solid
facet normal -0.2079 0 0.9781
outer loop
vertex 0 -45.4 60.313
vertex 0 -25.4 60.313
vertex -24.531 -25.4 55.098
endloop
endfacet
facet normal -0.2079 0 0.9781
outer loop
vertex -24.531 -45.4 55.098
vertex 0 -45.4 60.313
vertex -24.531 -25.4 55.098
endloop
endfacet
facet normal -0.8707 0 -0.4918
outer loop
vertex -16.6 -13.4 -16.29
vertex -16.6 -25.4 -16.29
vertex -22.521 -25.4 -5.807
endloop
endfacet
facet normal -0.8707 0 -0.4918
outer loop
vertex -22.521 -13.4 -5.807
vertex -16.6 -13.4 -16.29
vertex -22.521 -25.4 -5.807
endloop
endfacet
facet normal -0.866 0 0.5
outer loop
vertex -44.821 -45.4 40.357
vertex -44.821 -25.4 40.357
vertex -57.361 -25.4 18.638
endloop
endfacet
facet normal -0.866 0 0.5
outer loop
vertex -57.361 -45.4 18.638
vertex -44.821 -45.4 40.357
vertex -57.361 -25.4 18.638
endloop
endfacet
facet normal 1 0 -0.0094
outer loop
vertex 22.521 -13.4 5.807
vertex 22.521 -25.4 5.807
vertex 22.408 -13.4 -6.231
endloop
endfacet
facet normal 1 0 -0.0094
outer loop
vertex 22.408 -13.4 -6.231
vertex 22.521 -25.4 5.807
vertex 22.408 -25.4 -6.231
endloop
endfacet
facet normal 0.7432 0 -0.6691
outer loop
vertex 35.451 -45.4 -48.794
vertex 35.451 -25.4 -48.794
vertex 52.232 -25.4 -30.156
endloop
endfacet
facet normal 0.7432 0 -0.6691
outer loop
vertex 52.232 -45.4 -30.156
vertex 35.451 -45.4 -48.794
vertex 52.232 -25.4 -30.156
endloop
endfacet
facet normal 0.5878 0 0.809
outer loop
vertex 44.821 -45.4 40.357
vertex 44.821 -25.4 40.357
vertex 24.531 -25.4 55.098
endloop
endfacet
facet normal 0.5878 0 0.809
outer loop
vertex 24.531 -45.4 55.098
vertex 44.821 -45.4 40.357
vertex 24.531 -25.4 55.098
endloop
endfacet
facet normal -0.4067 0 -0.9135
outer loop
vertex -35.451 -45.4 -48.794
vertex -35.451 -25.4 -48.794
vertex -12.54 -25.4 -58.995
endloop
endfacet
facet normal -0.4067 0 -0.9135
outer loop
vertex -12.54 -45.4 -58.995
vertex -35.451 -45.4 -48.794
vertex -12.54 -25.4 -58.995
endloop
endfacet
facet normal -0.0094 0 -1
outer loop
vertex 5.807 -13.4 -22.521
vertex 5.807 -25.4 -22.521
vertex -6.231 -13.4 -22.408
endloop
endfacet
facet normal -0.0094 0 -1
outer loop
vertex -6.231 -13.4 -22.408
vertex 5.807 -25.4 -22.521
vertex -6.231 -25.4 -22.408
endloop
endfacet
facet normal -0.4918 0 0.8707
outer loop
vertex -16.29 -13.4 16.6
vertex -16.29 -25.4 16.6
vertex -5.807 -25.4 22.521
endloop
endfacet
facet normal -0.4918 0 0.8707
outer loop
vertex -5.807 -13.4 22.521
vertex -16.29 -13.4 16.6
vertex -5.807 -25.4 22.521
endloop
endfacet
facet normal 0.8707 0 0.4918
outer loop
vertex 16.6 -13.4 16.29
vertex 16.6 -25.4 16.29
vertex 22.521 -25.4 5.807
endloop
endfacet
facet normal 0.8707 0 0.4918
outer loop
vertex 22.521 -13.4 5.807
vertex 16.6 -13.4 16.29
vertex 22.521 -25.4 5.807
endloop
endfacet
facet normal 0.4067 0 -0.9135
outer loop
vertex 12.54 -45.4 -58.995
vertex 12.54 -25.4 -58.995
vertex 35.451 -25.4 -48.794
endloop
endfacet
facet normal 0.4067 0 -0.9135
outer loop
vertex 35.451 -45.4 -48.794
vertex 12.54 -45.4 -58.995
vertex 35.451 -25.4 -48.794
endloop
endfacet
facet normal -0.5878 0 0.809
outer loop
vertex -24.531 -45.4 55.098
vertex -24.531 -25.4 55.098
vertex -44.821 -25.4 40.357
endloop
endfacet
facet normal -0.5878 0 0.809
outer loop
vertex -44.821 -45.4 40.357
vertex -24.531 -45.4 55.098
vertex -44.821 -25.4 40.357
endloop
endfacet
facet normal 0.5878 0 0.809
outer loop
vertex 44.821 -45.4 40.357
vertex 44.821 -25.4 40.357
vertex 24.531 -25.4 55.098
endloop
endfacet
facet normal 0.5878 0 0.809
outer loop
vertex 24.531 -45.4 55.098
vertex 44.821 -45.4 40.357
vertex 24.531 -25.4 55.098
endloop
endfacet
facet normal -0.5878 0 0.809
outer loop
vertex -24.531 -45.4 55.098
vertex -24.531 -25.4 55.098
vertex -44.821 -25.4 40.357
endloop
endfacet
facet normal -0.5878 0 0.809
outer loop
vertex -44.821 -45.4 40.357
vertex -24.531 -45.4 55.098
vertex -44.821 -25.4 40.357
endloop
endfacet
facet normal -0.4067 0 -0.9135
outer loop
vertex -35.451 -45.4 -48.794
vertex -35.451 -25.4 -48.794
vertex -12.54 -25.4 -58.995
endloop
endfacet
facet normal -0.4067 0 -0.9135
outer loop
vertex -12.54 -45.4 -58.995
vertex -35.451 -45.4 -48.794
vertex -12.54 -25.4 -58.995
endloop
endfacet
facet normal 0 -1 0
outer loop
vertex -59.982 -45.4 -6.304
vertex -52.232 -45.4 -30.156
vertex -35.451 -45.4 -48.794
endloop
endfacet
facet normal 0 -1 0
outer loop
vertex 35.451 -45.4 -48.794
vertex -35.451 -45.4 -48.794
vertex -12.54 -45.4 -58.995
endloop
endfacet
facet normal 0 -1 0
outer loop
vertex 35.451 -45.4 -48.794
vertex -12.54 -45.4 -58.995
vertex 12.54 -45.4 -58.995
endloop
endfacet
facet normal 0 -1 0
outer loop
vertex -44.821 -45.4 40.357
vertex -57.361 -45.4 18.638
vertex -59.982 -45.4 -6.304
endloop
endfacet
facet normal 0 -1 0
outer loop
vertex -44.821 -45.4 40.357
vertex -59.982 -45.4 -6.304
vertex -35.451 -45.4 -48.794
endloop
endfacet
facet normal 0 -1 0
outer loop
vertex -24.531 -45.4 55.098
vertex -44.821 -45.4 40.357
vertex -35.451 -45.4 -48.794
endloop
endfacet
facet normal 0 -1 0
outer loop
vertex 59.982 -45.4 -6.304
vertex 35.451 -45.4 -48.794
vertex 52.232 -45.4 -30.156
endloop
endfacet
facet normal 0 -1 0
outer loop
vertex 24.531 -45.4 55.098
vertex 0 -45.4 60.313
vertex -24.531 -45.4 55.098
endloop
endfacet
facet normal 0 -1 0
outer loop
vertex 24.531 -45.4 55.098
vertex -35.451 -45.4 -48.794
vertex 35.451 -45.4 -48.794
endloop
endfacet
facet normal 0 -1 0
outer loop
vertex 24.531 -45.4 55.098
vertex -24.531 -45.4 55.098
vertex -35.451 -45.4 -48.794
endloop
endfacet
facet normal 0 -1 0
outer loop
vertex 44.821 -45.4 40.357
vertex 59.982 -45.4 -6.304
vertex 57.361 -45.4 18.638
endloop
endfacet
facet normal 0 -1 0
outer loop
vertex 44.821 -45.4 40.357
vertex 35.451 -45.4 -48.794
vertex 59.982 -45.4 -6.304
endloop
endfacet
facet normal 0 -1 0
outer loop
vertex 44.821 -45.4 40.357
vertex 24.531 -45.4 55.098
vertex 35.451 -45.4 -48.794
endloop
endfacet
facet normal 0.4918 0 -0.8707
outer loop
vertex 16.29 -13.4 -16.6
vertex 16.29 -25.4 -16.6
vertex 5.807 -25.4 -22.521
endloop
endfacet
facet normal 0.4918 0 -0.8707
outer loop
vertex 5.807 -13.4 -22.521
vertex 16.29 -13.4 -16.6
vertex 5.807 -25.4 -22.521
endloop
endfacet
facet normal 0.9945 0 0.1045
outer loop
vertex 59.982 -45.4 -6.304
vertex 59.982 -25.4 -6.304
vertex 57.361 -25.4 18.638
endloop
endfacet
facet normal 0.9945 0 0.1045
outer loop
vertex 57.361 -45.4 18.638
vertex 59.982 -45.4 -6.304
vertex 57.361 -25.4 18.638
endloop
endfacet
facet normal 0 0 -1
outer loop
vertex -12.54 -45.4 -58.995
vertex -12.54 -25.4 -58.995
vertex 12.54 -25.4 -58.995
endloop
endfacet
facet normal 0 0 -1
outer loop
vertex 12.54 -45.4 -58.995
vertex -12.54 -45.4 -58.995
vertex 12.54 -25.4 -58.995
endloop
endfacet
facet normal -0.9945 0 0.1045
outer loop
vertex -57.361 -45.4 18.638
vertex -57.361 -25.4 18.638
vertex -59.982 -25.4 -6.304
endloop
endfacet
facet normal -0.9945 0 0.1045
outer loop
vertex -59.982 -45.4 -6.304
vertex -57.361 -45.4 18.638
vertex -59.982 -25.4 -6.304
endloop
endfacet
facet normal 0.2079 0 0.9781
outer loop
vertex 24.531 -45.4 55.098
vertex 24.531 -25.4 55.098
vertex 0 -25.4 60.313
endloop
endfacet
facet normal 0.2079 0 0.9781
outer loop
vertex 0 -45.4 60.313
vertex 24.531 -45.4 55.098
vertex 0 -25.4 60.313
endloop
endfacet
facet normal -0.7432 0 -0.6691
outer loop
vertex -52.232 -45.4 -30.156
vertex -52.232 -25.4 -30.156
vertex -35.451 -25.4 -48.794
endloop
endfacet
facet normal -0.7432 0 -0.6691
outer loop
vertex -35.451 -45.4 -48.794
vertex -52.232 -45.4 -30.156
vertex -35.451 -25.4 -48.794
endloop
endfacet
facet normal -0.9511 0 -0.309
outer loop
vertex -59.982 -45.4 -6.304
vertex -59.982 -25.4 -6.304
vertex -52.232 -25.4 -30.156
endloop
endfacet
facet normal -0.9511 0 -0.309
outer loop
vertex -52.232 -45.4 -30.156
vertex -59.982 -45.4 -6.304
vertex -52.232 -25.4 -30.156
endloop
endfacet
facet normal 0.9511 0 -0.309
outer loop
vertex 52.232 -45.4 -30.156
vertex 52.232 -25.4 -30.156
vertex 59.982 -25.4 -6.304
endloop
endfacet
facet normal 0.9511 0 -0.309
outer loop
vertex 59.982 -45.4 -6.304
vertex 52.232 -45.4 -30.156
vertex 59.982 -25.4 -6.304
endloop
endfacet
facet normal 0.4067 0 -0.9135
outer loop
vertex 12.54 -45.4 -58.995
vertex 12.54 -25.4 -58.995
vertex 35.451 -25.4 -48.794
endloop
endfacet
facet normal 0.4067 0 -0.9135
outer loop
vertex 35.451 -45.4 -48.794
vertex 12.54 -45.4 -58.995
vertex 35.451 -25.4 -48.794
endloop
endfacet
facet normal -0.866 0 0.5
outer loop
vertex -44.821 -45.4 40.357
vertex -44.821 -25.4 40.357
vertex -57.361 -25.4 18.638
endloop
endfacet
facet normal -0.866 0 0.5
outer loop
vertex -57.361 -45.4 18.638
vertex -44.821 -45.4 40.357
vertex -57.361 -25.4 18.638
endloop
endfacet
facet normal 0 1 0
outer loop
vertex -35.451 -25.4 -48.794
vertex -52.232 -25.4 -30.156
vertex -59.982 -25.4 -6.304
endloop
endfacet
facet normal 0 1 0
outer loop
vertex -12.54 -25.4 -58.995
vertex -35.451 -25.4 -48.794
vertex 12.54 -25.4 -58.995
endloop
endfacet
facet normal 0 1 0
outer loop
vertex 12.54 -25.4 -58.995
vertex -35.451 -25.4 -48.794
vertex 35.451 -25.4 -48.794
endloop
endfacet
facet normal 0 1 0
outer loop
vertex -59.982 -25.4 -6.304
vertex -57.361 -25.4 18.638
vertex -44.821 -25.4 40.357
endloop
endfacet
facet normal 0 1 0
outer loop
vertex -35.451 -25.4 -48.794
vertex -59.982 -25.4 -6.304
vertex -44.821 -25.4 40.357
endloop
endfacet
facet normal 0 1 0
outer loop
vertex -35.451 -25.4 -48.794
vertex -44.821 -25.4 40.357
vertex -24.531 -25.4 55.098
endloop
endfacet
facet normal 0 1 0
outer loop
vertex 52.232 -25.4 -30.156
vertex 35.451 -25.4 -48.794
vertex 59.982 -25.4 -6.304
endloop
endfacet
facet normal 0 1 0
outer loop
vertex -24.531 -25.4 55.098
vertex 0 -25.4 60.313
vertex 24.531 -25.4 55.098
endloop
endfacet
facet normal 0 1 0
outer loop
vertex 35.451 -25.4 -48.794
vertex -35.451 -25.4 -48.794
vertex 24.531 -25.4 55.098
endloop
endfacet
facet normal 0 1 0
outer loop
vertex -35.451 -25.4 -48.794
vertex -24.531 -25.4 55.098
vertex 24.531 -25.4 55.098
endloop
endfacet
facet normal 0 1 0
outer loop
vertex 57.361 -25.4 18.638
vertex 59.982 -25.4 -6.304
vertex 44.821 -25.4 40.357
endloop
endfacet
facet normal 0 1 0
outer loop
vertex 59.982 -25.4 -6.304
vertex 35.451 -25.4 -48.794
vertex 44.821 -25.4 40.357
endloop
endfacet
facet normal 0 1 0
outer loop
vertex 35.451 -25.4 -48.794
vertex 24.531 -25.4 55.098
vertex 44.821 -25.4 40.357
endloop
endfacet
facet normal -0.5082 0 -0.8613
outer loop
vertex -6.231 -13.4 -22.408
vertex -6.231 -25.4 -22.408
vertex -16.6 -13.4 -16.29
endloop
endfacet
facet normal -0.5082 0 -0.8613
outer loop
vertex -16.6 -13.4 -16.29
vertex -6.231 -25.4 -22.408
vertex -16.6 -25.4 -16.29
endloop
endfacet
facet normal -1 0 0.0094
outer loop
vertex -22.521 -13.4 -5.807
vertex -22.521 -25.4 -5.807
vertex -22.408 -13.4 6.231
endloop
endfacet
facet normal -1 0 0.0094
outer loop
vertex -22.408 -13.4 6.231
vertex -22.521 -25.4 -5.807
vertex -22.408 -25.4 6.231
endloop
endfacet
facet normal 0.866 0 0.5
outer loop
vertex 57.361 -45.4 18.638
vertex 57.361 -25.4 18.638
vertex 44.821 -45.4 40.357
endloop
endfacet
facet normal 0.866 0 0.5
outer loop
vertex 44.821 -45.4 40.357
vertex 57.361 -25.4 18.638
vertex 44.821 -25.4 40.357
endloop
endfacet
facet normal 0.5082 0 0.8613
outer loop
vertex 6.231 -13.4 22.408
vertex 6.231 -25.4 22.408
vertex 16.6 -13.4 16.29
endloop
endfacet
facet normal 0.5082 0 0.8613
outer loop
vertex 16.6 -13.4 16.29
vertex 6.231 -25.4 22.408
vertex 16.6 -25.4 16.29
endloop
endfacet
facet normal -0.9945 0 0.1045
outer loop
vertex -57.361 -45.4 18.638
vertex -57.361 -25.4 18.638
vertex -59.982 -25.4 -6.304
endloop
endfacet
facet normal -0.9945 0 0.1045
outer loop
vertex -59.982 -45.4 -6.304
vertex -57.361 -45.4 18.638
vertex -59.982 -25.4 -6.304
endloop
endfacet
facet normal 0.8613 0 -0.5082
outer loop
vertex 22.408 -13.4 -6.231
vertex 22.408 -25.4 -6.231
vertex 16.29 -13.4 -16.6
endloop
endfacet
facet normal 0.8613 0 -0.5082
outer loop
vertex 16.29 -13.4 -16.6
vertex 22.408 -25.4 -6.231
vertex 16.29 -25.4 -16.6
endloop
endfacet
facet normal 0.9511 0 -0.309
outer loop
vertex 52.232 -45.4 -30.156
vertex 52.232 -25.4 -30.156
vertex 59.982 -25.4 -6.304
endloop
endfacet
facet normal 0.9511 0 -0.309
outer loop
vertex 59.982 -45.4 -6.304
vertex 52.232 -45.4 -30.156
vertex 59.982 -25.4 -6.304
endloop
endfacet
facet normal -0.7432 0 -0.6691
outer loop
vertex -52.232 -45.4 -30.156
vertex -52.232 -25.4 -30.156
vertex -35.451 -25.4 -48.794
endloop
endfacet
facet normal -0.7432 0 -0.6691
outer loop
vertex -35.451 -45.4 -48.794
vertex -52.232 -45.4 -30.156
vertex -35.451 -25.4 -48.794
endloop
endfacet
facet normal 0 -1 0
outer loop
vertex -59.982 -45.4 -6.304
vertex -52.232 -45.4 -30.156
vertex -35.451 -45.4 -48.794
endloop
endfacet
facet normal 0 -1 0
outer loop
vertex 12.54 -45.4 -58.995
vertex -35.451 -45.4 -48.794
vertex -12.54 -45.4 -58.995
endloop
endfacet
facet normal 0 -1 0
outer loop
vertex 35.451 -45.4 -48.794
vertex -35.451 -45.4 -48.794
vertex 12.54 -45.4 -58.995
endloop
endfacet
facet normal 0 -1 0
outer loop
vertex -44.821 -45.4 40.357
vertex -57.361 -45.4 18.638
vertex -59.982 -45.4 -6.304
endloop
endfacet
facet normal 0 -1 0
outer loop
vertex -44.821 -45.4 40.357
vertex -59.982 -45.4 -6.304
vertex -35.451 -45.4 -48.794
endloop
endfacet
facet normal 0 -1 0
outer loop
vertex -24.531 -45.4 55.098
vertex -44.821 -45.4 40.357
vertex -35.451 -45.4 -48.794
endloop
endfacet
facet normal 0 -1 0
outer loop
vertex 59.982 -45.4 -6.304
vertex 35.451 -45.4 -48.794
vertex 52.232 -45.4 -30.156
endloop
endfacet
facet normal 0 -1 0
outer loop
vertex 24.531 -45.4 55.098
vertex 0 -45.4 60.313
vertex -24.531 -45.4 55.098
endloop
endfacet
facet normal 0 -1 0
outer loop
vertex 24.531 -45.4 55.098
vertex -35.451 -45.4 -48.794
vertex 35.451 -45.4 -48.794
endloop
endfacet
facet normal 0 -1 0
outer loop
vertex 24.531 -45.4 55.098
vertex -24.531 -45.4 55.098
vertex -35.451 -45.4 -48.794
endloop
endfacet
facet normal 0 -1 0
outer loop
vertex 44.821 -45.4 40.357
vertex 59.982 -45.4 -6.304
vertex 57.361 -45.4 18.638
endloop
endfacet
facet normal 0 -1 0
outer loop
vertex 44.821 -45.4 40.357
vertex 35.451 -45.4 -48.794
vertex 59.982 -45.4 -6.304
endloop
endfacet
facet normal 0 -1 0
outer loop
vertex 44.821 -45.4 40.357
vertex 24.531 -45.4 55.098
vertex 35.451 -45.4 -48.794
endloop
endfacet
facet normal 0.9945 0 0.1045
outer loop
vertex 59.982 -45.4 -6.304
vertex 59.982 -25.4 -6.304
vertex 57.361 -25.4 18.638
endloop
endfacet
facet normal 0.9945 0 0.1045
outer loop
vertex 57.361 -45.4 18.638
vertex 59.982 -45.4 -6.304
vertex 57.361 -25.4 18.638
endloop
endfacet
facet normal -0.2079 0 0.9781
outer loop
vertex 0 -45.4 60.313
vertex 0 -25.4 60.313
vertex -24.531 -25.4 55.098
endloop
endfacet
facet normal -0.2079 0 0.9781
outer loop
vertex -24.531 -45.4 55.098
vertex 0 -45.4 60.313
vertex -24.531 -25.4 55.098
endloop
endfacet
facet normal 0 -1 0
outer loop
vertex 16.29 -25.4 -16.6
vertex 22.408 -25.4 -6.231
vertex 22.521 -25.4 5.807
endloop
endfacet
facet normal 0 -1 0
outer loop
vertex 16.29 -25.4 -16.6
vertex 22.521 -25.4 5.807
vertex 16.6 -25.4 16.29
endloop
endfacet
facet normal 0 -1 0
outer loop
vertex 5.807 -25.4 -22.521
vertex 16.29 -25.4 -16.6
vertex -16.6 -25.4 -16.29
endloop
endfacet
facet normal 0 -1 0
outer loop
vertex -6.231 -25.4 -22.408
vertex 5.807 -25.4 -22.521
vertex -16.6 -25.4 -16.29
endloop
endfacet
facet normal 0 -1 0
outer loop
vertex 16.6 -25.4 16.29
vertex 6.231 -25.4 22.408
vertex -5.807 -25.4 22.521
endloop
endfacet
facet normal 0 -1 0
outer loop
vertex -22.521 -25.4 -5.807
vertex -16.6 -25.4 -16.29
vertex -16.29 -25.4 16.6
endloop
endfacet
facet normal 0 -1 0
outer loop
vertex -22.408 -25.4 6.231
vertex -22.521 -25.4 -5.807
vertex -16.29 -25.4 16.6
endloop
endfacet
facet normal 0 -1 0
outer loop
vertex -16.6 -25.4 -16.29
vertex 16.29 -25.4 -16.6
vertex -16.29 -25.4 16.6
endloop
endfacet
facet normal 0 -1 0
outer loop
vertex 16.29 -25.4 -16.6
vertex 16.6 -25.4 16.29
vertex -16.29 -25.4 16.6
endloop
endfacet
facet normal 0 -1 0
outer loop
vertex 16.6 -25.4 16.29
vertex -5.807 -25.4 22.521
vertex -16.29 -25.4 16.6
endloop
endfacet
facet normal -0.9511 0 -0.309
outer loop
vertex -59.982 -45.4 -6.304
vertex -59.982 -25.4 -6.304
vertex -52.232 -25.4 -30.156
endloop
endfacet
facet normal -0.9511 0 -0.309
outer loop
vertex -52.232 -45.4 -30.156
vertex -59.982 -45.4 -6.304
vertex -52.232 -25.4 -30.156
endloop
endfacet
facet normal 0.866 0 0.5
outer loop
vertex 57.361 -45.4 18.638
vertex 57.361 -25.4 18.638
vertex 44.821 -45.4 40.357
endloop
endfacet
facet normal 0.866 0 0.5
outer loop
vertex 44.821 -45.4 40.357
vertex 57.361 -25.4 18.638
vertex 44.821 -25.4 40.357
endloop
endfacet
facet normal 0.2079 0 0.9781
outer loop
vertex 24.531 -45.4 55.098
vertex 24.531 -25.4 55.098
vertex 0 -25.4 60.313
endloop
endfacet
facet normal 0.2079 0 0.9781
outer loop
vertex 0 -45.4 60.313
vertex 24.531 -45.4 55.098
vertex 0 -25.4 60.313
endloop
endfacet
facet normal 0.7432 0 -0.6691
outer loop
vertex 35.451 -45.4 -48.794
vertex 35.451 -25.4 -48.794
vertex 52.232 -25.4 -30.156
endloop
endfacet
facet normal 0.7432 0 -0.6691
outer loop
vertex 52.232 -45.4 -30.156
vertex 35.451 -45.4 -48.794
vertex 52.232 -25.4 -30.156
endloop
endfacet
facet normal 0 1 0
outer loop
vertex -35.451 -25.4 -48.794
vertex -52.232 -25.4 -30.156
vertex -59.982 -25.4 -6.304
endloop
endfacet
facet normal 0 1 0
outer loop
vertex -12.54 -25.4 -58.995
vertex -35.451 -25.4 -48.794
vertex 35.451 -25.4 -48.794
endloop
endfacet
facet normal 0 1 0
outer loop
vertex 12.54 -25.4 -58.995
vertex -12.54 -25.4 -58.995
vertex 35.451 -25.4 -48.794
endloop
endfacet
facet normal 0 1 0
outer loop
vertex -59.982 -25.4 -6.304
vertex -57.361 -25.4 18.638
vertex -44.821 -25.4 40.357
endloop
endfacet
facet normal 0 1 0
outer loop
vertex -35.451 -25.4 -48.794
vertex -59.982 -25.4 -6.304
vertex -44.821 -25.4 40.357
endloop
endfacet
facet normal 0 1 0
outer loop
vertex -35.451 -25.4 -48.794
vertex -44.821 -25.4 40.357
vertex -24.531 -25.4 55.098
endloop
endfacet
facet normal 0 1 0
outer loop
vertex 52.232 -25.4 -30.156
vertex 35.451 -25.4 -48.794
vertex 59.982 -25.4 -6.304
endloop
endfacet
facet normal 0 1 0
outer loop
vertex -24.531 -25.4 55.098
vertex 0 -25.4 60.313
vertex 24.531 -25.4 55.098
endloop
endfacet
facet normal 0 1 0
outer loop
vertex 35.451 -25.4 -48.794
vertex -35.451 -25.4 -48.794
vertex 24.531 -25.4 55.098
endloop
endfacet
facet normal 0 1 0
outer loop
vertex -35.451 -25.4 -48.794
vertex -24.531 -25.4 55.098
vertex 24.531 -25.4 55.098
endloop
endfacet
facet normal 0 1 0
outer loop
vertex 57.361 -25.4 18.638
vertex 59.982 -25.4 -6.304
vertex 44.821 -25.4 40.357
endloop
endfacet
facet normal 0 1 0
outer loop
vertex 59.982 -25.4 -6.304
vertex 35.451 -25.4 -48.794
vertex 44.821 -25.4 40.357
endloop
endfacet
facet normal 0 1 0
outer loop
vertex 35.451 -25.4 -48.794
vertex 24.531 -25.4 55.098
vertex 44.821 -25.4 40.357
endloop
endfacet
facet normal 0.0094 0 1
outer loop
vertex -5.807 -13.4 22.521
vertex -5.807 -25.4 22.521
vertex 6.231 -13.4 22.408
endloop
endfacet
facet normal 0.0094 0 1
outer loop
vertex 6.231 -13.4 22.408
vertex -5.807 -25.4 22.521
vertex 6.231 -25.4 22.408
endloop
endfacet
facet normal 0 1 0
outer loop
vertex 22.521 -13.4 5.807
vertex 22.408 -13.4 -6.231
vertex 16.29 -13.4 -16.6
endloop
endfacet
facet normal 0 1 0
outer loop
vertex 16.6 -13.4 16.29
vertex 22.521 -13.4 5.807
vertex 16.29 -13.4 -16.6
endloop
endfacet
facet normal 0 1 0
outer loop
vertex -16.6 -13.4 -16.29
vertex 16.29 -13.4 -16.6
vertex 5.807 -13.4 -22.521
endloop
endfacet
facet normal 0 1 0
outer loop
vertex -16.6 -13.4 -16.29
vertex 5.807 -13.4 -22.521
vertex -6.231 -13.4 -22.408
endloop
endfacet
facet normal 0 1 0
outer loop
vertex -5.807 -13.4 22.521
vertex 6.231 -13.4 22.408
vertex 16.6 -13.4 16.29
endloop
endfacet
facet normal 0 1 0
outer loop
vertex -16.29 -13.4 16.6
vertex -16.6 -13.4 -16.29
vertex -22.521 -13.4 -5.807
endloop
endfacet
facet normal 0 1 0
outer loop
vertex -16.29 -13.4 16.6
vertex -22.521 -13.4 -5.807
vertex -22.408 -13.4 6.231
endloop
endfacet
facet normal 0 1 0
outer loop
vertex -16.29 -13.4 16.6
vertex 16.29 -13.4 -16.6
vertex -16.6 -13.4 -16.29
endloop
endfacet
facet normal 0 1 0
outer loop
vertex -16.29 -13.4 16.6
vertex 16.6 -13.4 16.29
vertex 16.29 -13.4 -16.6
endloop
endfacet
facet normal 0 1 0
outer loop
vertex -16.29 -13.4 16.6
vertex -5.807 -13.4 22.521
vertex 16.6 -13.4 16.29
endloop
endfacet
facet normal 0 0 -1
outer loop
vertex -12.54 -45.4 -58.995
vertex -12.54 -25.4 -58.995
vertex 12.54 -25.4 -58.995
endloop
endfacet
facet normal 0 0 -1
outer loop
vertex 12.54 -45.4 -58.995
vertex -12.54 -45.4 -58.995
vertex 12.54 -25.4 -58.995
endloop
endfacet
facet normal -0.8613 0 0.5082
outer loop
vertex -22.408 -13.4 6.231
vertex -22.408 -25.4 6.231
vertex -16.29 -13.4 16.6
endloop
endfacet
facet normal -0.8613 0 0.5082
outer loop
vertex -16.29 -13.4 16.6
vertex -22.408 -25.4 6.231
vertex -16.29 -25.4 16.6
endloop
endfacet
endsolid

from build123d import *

# Parameters (mm, degrees)
F3_DEPTH = 20
F2_R     = 39.8942276876
F5_DEPTH = 12


with BuildPart() as f3:
    # F1 (on offset) → F3 (new body)
    with BuildSketch(Plane.XZ.offset(25.4)):
        Polygon((-12.5397381477, -58.9948296547), (12.5397381477, -58.9948296547), (35.4509797974, -48.7940876562), (52.2324249782, -30.1564046216), (59.9824093635, -6.3044052655), (57.3608902468, 18.6376830346), (44.821152099, 40.3571466201), (24.531429566, 55.0984929217), (0, 60.3128092431), (-24.531429566, 55.0984929217), (-44.821152099, 40.3571466201), (-57.3608902468, 18.6376830346), (-59.9824093635, -6.3044052655), (-52.2324249782, -30.1564046216), (-35.4509797974, -48.7940876562), align=None)
    extrude(amount=F3_DEPTH)


with BuildPart() as f3b:
    # F2 (on face) → F3, piece 2 (new body)
    with BuildSketch(Plane.XZ.offset(25.4)):
        Polygon((-35.4509797974, -48.7940876562), (-12.5397381477, -58.9948296547), (12.5397381477, -58.9948296547), (35.4509797974, -48.7940876562), (52.2324249782, -30.1564046216), (59.9824093635, -6.3044052655), (57.3608902468, 18.6376830346), (44.821152099, 40.3571466201), (24.531429566, 55.0984929217), (0, 60.3128092431), (-24.531429566, 55.0984929217), (-44.821152099, 40.3571466201), (-57.3608902468, 18.6376830346), (-59.9824093635, -6.3044052655), (-52.2324249782, -30.1564046216), align=None)
        Circle(F2_R, mode=Mode.SUBTRACT)
        Circle(F2_R)
    extrude(amount=F3_DEPTH)


with BuildPart() as f5:
    # F4 (on face) → F5 (new body)
    with BuildSketch(Plane(origin=(0, -25.4, 0), x_dir=(-1, 0, 0), z_dir=(0, 1, 0))):
        Polygon((-6.23132674, 22.4077623165), (-16.6003684143, 16.290028038), (-22.521354778, 5.8073939021), (-22.4077623165, -6.23132674), (-16.290028038, -16.6003684143), (-5.8073939021, -22.521354778), (6.23132674, -22.4077623165), (16.6003684143, -16.290028038), (22.521354778, -5.8073939021), (22.4077623165, 6.23132674), (16.290028038, 16.6003684143), (5.8073939021, 22.521354778), align=None)
    extrude(amount=F5_DEPTH)


solid = Compound([f3.part, f3b.part, f5.part])
